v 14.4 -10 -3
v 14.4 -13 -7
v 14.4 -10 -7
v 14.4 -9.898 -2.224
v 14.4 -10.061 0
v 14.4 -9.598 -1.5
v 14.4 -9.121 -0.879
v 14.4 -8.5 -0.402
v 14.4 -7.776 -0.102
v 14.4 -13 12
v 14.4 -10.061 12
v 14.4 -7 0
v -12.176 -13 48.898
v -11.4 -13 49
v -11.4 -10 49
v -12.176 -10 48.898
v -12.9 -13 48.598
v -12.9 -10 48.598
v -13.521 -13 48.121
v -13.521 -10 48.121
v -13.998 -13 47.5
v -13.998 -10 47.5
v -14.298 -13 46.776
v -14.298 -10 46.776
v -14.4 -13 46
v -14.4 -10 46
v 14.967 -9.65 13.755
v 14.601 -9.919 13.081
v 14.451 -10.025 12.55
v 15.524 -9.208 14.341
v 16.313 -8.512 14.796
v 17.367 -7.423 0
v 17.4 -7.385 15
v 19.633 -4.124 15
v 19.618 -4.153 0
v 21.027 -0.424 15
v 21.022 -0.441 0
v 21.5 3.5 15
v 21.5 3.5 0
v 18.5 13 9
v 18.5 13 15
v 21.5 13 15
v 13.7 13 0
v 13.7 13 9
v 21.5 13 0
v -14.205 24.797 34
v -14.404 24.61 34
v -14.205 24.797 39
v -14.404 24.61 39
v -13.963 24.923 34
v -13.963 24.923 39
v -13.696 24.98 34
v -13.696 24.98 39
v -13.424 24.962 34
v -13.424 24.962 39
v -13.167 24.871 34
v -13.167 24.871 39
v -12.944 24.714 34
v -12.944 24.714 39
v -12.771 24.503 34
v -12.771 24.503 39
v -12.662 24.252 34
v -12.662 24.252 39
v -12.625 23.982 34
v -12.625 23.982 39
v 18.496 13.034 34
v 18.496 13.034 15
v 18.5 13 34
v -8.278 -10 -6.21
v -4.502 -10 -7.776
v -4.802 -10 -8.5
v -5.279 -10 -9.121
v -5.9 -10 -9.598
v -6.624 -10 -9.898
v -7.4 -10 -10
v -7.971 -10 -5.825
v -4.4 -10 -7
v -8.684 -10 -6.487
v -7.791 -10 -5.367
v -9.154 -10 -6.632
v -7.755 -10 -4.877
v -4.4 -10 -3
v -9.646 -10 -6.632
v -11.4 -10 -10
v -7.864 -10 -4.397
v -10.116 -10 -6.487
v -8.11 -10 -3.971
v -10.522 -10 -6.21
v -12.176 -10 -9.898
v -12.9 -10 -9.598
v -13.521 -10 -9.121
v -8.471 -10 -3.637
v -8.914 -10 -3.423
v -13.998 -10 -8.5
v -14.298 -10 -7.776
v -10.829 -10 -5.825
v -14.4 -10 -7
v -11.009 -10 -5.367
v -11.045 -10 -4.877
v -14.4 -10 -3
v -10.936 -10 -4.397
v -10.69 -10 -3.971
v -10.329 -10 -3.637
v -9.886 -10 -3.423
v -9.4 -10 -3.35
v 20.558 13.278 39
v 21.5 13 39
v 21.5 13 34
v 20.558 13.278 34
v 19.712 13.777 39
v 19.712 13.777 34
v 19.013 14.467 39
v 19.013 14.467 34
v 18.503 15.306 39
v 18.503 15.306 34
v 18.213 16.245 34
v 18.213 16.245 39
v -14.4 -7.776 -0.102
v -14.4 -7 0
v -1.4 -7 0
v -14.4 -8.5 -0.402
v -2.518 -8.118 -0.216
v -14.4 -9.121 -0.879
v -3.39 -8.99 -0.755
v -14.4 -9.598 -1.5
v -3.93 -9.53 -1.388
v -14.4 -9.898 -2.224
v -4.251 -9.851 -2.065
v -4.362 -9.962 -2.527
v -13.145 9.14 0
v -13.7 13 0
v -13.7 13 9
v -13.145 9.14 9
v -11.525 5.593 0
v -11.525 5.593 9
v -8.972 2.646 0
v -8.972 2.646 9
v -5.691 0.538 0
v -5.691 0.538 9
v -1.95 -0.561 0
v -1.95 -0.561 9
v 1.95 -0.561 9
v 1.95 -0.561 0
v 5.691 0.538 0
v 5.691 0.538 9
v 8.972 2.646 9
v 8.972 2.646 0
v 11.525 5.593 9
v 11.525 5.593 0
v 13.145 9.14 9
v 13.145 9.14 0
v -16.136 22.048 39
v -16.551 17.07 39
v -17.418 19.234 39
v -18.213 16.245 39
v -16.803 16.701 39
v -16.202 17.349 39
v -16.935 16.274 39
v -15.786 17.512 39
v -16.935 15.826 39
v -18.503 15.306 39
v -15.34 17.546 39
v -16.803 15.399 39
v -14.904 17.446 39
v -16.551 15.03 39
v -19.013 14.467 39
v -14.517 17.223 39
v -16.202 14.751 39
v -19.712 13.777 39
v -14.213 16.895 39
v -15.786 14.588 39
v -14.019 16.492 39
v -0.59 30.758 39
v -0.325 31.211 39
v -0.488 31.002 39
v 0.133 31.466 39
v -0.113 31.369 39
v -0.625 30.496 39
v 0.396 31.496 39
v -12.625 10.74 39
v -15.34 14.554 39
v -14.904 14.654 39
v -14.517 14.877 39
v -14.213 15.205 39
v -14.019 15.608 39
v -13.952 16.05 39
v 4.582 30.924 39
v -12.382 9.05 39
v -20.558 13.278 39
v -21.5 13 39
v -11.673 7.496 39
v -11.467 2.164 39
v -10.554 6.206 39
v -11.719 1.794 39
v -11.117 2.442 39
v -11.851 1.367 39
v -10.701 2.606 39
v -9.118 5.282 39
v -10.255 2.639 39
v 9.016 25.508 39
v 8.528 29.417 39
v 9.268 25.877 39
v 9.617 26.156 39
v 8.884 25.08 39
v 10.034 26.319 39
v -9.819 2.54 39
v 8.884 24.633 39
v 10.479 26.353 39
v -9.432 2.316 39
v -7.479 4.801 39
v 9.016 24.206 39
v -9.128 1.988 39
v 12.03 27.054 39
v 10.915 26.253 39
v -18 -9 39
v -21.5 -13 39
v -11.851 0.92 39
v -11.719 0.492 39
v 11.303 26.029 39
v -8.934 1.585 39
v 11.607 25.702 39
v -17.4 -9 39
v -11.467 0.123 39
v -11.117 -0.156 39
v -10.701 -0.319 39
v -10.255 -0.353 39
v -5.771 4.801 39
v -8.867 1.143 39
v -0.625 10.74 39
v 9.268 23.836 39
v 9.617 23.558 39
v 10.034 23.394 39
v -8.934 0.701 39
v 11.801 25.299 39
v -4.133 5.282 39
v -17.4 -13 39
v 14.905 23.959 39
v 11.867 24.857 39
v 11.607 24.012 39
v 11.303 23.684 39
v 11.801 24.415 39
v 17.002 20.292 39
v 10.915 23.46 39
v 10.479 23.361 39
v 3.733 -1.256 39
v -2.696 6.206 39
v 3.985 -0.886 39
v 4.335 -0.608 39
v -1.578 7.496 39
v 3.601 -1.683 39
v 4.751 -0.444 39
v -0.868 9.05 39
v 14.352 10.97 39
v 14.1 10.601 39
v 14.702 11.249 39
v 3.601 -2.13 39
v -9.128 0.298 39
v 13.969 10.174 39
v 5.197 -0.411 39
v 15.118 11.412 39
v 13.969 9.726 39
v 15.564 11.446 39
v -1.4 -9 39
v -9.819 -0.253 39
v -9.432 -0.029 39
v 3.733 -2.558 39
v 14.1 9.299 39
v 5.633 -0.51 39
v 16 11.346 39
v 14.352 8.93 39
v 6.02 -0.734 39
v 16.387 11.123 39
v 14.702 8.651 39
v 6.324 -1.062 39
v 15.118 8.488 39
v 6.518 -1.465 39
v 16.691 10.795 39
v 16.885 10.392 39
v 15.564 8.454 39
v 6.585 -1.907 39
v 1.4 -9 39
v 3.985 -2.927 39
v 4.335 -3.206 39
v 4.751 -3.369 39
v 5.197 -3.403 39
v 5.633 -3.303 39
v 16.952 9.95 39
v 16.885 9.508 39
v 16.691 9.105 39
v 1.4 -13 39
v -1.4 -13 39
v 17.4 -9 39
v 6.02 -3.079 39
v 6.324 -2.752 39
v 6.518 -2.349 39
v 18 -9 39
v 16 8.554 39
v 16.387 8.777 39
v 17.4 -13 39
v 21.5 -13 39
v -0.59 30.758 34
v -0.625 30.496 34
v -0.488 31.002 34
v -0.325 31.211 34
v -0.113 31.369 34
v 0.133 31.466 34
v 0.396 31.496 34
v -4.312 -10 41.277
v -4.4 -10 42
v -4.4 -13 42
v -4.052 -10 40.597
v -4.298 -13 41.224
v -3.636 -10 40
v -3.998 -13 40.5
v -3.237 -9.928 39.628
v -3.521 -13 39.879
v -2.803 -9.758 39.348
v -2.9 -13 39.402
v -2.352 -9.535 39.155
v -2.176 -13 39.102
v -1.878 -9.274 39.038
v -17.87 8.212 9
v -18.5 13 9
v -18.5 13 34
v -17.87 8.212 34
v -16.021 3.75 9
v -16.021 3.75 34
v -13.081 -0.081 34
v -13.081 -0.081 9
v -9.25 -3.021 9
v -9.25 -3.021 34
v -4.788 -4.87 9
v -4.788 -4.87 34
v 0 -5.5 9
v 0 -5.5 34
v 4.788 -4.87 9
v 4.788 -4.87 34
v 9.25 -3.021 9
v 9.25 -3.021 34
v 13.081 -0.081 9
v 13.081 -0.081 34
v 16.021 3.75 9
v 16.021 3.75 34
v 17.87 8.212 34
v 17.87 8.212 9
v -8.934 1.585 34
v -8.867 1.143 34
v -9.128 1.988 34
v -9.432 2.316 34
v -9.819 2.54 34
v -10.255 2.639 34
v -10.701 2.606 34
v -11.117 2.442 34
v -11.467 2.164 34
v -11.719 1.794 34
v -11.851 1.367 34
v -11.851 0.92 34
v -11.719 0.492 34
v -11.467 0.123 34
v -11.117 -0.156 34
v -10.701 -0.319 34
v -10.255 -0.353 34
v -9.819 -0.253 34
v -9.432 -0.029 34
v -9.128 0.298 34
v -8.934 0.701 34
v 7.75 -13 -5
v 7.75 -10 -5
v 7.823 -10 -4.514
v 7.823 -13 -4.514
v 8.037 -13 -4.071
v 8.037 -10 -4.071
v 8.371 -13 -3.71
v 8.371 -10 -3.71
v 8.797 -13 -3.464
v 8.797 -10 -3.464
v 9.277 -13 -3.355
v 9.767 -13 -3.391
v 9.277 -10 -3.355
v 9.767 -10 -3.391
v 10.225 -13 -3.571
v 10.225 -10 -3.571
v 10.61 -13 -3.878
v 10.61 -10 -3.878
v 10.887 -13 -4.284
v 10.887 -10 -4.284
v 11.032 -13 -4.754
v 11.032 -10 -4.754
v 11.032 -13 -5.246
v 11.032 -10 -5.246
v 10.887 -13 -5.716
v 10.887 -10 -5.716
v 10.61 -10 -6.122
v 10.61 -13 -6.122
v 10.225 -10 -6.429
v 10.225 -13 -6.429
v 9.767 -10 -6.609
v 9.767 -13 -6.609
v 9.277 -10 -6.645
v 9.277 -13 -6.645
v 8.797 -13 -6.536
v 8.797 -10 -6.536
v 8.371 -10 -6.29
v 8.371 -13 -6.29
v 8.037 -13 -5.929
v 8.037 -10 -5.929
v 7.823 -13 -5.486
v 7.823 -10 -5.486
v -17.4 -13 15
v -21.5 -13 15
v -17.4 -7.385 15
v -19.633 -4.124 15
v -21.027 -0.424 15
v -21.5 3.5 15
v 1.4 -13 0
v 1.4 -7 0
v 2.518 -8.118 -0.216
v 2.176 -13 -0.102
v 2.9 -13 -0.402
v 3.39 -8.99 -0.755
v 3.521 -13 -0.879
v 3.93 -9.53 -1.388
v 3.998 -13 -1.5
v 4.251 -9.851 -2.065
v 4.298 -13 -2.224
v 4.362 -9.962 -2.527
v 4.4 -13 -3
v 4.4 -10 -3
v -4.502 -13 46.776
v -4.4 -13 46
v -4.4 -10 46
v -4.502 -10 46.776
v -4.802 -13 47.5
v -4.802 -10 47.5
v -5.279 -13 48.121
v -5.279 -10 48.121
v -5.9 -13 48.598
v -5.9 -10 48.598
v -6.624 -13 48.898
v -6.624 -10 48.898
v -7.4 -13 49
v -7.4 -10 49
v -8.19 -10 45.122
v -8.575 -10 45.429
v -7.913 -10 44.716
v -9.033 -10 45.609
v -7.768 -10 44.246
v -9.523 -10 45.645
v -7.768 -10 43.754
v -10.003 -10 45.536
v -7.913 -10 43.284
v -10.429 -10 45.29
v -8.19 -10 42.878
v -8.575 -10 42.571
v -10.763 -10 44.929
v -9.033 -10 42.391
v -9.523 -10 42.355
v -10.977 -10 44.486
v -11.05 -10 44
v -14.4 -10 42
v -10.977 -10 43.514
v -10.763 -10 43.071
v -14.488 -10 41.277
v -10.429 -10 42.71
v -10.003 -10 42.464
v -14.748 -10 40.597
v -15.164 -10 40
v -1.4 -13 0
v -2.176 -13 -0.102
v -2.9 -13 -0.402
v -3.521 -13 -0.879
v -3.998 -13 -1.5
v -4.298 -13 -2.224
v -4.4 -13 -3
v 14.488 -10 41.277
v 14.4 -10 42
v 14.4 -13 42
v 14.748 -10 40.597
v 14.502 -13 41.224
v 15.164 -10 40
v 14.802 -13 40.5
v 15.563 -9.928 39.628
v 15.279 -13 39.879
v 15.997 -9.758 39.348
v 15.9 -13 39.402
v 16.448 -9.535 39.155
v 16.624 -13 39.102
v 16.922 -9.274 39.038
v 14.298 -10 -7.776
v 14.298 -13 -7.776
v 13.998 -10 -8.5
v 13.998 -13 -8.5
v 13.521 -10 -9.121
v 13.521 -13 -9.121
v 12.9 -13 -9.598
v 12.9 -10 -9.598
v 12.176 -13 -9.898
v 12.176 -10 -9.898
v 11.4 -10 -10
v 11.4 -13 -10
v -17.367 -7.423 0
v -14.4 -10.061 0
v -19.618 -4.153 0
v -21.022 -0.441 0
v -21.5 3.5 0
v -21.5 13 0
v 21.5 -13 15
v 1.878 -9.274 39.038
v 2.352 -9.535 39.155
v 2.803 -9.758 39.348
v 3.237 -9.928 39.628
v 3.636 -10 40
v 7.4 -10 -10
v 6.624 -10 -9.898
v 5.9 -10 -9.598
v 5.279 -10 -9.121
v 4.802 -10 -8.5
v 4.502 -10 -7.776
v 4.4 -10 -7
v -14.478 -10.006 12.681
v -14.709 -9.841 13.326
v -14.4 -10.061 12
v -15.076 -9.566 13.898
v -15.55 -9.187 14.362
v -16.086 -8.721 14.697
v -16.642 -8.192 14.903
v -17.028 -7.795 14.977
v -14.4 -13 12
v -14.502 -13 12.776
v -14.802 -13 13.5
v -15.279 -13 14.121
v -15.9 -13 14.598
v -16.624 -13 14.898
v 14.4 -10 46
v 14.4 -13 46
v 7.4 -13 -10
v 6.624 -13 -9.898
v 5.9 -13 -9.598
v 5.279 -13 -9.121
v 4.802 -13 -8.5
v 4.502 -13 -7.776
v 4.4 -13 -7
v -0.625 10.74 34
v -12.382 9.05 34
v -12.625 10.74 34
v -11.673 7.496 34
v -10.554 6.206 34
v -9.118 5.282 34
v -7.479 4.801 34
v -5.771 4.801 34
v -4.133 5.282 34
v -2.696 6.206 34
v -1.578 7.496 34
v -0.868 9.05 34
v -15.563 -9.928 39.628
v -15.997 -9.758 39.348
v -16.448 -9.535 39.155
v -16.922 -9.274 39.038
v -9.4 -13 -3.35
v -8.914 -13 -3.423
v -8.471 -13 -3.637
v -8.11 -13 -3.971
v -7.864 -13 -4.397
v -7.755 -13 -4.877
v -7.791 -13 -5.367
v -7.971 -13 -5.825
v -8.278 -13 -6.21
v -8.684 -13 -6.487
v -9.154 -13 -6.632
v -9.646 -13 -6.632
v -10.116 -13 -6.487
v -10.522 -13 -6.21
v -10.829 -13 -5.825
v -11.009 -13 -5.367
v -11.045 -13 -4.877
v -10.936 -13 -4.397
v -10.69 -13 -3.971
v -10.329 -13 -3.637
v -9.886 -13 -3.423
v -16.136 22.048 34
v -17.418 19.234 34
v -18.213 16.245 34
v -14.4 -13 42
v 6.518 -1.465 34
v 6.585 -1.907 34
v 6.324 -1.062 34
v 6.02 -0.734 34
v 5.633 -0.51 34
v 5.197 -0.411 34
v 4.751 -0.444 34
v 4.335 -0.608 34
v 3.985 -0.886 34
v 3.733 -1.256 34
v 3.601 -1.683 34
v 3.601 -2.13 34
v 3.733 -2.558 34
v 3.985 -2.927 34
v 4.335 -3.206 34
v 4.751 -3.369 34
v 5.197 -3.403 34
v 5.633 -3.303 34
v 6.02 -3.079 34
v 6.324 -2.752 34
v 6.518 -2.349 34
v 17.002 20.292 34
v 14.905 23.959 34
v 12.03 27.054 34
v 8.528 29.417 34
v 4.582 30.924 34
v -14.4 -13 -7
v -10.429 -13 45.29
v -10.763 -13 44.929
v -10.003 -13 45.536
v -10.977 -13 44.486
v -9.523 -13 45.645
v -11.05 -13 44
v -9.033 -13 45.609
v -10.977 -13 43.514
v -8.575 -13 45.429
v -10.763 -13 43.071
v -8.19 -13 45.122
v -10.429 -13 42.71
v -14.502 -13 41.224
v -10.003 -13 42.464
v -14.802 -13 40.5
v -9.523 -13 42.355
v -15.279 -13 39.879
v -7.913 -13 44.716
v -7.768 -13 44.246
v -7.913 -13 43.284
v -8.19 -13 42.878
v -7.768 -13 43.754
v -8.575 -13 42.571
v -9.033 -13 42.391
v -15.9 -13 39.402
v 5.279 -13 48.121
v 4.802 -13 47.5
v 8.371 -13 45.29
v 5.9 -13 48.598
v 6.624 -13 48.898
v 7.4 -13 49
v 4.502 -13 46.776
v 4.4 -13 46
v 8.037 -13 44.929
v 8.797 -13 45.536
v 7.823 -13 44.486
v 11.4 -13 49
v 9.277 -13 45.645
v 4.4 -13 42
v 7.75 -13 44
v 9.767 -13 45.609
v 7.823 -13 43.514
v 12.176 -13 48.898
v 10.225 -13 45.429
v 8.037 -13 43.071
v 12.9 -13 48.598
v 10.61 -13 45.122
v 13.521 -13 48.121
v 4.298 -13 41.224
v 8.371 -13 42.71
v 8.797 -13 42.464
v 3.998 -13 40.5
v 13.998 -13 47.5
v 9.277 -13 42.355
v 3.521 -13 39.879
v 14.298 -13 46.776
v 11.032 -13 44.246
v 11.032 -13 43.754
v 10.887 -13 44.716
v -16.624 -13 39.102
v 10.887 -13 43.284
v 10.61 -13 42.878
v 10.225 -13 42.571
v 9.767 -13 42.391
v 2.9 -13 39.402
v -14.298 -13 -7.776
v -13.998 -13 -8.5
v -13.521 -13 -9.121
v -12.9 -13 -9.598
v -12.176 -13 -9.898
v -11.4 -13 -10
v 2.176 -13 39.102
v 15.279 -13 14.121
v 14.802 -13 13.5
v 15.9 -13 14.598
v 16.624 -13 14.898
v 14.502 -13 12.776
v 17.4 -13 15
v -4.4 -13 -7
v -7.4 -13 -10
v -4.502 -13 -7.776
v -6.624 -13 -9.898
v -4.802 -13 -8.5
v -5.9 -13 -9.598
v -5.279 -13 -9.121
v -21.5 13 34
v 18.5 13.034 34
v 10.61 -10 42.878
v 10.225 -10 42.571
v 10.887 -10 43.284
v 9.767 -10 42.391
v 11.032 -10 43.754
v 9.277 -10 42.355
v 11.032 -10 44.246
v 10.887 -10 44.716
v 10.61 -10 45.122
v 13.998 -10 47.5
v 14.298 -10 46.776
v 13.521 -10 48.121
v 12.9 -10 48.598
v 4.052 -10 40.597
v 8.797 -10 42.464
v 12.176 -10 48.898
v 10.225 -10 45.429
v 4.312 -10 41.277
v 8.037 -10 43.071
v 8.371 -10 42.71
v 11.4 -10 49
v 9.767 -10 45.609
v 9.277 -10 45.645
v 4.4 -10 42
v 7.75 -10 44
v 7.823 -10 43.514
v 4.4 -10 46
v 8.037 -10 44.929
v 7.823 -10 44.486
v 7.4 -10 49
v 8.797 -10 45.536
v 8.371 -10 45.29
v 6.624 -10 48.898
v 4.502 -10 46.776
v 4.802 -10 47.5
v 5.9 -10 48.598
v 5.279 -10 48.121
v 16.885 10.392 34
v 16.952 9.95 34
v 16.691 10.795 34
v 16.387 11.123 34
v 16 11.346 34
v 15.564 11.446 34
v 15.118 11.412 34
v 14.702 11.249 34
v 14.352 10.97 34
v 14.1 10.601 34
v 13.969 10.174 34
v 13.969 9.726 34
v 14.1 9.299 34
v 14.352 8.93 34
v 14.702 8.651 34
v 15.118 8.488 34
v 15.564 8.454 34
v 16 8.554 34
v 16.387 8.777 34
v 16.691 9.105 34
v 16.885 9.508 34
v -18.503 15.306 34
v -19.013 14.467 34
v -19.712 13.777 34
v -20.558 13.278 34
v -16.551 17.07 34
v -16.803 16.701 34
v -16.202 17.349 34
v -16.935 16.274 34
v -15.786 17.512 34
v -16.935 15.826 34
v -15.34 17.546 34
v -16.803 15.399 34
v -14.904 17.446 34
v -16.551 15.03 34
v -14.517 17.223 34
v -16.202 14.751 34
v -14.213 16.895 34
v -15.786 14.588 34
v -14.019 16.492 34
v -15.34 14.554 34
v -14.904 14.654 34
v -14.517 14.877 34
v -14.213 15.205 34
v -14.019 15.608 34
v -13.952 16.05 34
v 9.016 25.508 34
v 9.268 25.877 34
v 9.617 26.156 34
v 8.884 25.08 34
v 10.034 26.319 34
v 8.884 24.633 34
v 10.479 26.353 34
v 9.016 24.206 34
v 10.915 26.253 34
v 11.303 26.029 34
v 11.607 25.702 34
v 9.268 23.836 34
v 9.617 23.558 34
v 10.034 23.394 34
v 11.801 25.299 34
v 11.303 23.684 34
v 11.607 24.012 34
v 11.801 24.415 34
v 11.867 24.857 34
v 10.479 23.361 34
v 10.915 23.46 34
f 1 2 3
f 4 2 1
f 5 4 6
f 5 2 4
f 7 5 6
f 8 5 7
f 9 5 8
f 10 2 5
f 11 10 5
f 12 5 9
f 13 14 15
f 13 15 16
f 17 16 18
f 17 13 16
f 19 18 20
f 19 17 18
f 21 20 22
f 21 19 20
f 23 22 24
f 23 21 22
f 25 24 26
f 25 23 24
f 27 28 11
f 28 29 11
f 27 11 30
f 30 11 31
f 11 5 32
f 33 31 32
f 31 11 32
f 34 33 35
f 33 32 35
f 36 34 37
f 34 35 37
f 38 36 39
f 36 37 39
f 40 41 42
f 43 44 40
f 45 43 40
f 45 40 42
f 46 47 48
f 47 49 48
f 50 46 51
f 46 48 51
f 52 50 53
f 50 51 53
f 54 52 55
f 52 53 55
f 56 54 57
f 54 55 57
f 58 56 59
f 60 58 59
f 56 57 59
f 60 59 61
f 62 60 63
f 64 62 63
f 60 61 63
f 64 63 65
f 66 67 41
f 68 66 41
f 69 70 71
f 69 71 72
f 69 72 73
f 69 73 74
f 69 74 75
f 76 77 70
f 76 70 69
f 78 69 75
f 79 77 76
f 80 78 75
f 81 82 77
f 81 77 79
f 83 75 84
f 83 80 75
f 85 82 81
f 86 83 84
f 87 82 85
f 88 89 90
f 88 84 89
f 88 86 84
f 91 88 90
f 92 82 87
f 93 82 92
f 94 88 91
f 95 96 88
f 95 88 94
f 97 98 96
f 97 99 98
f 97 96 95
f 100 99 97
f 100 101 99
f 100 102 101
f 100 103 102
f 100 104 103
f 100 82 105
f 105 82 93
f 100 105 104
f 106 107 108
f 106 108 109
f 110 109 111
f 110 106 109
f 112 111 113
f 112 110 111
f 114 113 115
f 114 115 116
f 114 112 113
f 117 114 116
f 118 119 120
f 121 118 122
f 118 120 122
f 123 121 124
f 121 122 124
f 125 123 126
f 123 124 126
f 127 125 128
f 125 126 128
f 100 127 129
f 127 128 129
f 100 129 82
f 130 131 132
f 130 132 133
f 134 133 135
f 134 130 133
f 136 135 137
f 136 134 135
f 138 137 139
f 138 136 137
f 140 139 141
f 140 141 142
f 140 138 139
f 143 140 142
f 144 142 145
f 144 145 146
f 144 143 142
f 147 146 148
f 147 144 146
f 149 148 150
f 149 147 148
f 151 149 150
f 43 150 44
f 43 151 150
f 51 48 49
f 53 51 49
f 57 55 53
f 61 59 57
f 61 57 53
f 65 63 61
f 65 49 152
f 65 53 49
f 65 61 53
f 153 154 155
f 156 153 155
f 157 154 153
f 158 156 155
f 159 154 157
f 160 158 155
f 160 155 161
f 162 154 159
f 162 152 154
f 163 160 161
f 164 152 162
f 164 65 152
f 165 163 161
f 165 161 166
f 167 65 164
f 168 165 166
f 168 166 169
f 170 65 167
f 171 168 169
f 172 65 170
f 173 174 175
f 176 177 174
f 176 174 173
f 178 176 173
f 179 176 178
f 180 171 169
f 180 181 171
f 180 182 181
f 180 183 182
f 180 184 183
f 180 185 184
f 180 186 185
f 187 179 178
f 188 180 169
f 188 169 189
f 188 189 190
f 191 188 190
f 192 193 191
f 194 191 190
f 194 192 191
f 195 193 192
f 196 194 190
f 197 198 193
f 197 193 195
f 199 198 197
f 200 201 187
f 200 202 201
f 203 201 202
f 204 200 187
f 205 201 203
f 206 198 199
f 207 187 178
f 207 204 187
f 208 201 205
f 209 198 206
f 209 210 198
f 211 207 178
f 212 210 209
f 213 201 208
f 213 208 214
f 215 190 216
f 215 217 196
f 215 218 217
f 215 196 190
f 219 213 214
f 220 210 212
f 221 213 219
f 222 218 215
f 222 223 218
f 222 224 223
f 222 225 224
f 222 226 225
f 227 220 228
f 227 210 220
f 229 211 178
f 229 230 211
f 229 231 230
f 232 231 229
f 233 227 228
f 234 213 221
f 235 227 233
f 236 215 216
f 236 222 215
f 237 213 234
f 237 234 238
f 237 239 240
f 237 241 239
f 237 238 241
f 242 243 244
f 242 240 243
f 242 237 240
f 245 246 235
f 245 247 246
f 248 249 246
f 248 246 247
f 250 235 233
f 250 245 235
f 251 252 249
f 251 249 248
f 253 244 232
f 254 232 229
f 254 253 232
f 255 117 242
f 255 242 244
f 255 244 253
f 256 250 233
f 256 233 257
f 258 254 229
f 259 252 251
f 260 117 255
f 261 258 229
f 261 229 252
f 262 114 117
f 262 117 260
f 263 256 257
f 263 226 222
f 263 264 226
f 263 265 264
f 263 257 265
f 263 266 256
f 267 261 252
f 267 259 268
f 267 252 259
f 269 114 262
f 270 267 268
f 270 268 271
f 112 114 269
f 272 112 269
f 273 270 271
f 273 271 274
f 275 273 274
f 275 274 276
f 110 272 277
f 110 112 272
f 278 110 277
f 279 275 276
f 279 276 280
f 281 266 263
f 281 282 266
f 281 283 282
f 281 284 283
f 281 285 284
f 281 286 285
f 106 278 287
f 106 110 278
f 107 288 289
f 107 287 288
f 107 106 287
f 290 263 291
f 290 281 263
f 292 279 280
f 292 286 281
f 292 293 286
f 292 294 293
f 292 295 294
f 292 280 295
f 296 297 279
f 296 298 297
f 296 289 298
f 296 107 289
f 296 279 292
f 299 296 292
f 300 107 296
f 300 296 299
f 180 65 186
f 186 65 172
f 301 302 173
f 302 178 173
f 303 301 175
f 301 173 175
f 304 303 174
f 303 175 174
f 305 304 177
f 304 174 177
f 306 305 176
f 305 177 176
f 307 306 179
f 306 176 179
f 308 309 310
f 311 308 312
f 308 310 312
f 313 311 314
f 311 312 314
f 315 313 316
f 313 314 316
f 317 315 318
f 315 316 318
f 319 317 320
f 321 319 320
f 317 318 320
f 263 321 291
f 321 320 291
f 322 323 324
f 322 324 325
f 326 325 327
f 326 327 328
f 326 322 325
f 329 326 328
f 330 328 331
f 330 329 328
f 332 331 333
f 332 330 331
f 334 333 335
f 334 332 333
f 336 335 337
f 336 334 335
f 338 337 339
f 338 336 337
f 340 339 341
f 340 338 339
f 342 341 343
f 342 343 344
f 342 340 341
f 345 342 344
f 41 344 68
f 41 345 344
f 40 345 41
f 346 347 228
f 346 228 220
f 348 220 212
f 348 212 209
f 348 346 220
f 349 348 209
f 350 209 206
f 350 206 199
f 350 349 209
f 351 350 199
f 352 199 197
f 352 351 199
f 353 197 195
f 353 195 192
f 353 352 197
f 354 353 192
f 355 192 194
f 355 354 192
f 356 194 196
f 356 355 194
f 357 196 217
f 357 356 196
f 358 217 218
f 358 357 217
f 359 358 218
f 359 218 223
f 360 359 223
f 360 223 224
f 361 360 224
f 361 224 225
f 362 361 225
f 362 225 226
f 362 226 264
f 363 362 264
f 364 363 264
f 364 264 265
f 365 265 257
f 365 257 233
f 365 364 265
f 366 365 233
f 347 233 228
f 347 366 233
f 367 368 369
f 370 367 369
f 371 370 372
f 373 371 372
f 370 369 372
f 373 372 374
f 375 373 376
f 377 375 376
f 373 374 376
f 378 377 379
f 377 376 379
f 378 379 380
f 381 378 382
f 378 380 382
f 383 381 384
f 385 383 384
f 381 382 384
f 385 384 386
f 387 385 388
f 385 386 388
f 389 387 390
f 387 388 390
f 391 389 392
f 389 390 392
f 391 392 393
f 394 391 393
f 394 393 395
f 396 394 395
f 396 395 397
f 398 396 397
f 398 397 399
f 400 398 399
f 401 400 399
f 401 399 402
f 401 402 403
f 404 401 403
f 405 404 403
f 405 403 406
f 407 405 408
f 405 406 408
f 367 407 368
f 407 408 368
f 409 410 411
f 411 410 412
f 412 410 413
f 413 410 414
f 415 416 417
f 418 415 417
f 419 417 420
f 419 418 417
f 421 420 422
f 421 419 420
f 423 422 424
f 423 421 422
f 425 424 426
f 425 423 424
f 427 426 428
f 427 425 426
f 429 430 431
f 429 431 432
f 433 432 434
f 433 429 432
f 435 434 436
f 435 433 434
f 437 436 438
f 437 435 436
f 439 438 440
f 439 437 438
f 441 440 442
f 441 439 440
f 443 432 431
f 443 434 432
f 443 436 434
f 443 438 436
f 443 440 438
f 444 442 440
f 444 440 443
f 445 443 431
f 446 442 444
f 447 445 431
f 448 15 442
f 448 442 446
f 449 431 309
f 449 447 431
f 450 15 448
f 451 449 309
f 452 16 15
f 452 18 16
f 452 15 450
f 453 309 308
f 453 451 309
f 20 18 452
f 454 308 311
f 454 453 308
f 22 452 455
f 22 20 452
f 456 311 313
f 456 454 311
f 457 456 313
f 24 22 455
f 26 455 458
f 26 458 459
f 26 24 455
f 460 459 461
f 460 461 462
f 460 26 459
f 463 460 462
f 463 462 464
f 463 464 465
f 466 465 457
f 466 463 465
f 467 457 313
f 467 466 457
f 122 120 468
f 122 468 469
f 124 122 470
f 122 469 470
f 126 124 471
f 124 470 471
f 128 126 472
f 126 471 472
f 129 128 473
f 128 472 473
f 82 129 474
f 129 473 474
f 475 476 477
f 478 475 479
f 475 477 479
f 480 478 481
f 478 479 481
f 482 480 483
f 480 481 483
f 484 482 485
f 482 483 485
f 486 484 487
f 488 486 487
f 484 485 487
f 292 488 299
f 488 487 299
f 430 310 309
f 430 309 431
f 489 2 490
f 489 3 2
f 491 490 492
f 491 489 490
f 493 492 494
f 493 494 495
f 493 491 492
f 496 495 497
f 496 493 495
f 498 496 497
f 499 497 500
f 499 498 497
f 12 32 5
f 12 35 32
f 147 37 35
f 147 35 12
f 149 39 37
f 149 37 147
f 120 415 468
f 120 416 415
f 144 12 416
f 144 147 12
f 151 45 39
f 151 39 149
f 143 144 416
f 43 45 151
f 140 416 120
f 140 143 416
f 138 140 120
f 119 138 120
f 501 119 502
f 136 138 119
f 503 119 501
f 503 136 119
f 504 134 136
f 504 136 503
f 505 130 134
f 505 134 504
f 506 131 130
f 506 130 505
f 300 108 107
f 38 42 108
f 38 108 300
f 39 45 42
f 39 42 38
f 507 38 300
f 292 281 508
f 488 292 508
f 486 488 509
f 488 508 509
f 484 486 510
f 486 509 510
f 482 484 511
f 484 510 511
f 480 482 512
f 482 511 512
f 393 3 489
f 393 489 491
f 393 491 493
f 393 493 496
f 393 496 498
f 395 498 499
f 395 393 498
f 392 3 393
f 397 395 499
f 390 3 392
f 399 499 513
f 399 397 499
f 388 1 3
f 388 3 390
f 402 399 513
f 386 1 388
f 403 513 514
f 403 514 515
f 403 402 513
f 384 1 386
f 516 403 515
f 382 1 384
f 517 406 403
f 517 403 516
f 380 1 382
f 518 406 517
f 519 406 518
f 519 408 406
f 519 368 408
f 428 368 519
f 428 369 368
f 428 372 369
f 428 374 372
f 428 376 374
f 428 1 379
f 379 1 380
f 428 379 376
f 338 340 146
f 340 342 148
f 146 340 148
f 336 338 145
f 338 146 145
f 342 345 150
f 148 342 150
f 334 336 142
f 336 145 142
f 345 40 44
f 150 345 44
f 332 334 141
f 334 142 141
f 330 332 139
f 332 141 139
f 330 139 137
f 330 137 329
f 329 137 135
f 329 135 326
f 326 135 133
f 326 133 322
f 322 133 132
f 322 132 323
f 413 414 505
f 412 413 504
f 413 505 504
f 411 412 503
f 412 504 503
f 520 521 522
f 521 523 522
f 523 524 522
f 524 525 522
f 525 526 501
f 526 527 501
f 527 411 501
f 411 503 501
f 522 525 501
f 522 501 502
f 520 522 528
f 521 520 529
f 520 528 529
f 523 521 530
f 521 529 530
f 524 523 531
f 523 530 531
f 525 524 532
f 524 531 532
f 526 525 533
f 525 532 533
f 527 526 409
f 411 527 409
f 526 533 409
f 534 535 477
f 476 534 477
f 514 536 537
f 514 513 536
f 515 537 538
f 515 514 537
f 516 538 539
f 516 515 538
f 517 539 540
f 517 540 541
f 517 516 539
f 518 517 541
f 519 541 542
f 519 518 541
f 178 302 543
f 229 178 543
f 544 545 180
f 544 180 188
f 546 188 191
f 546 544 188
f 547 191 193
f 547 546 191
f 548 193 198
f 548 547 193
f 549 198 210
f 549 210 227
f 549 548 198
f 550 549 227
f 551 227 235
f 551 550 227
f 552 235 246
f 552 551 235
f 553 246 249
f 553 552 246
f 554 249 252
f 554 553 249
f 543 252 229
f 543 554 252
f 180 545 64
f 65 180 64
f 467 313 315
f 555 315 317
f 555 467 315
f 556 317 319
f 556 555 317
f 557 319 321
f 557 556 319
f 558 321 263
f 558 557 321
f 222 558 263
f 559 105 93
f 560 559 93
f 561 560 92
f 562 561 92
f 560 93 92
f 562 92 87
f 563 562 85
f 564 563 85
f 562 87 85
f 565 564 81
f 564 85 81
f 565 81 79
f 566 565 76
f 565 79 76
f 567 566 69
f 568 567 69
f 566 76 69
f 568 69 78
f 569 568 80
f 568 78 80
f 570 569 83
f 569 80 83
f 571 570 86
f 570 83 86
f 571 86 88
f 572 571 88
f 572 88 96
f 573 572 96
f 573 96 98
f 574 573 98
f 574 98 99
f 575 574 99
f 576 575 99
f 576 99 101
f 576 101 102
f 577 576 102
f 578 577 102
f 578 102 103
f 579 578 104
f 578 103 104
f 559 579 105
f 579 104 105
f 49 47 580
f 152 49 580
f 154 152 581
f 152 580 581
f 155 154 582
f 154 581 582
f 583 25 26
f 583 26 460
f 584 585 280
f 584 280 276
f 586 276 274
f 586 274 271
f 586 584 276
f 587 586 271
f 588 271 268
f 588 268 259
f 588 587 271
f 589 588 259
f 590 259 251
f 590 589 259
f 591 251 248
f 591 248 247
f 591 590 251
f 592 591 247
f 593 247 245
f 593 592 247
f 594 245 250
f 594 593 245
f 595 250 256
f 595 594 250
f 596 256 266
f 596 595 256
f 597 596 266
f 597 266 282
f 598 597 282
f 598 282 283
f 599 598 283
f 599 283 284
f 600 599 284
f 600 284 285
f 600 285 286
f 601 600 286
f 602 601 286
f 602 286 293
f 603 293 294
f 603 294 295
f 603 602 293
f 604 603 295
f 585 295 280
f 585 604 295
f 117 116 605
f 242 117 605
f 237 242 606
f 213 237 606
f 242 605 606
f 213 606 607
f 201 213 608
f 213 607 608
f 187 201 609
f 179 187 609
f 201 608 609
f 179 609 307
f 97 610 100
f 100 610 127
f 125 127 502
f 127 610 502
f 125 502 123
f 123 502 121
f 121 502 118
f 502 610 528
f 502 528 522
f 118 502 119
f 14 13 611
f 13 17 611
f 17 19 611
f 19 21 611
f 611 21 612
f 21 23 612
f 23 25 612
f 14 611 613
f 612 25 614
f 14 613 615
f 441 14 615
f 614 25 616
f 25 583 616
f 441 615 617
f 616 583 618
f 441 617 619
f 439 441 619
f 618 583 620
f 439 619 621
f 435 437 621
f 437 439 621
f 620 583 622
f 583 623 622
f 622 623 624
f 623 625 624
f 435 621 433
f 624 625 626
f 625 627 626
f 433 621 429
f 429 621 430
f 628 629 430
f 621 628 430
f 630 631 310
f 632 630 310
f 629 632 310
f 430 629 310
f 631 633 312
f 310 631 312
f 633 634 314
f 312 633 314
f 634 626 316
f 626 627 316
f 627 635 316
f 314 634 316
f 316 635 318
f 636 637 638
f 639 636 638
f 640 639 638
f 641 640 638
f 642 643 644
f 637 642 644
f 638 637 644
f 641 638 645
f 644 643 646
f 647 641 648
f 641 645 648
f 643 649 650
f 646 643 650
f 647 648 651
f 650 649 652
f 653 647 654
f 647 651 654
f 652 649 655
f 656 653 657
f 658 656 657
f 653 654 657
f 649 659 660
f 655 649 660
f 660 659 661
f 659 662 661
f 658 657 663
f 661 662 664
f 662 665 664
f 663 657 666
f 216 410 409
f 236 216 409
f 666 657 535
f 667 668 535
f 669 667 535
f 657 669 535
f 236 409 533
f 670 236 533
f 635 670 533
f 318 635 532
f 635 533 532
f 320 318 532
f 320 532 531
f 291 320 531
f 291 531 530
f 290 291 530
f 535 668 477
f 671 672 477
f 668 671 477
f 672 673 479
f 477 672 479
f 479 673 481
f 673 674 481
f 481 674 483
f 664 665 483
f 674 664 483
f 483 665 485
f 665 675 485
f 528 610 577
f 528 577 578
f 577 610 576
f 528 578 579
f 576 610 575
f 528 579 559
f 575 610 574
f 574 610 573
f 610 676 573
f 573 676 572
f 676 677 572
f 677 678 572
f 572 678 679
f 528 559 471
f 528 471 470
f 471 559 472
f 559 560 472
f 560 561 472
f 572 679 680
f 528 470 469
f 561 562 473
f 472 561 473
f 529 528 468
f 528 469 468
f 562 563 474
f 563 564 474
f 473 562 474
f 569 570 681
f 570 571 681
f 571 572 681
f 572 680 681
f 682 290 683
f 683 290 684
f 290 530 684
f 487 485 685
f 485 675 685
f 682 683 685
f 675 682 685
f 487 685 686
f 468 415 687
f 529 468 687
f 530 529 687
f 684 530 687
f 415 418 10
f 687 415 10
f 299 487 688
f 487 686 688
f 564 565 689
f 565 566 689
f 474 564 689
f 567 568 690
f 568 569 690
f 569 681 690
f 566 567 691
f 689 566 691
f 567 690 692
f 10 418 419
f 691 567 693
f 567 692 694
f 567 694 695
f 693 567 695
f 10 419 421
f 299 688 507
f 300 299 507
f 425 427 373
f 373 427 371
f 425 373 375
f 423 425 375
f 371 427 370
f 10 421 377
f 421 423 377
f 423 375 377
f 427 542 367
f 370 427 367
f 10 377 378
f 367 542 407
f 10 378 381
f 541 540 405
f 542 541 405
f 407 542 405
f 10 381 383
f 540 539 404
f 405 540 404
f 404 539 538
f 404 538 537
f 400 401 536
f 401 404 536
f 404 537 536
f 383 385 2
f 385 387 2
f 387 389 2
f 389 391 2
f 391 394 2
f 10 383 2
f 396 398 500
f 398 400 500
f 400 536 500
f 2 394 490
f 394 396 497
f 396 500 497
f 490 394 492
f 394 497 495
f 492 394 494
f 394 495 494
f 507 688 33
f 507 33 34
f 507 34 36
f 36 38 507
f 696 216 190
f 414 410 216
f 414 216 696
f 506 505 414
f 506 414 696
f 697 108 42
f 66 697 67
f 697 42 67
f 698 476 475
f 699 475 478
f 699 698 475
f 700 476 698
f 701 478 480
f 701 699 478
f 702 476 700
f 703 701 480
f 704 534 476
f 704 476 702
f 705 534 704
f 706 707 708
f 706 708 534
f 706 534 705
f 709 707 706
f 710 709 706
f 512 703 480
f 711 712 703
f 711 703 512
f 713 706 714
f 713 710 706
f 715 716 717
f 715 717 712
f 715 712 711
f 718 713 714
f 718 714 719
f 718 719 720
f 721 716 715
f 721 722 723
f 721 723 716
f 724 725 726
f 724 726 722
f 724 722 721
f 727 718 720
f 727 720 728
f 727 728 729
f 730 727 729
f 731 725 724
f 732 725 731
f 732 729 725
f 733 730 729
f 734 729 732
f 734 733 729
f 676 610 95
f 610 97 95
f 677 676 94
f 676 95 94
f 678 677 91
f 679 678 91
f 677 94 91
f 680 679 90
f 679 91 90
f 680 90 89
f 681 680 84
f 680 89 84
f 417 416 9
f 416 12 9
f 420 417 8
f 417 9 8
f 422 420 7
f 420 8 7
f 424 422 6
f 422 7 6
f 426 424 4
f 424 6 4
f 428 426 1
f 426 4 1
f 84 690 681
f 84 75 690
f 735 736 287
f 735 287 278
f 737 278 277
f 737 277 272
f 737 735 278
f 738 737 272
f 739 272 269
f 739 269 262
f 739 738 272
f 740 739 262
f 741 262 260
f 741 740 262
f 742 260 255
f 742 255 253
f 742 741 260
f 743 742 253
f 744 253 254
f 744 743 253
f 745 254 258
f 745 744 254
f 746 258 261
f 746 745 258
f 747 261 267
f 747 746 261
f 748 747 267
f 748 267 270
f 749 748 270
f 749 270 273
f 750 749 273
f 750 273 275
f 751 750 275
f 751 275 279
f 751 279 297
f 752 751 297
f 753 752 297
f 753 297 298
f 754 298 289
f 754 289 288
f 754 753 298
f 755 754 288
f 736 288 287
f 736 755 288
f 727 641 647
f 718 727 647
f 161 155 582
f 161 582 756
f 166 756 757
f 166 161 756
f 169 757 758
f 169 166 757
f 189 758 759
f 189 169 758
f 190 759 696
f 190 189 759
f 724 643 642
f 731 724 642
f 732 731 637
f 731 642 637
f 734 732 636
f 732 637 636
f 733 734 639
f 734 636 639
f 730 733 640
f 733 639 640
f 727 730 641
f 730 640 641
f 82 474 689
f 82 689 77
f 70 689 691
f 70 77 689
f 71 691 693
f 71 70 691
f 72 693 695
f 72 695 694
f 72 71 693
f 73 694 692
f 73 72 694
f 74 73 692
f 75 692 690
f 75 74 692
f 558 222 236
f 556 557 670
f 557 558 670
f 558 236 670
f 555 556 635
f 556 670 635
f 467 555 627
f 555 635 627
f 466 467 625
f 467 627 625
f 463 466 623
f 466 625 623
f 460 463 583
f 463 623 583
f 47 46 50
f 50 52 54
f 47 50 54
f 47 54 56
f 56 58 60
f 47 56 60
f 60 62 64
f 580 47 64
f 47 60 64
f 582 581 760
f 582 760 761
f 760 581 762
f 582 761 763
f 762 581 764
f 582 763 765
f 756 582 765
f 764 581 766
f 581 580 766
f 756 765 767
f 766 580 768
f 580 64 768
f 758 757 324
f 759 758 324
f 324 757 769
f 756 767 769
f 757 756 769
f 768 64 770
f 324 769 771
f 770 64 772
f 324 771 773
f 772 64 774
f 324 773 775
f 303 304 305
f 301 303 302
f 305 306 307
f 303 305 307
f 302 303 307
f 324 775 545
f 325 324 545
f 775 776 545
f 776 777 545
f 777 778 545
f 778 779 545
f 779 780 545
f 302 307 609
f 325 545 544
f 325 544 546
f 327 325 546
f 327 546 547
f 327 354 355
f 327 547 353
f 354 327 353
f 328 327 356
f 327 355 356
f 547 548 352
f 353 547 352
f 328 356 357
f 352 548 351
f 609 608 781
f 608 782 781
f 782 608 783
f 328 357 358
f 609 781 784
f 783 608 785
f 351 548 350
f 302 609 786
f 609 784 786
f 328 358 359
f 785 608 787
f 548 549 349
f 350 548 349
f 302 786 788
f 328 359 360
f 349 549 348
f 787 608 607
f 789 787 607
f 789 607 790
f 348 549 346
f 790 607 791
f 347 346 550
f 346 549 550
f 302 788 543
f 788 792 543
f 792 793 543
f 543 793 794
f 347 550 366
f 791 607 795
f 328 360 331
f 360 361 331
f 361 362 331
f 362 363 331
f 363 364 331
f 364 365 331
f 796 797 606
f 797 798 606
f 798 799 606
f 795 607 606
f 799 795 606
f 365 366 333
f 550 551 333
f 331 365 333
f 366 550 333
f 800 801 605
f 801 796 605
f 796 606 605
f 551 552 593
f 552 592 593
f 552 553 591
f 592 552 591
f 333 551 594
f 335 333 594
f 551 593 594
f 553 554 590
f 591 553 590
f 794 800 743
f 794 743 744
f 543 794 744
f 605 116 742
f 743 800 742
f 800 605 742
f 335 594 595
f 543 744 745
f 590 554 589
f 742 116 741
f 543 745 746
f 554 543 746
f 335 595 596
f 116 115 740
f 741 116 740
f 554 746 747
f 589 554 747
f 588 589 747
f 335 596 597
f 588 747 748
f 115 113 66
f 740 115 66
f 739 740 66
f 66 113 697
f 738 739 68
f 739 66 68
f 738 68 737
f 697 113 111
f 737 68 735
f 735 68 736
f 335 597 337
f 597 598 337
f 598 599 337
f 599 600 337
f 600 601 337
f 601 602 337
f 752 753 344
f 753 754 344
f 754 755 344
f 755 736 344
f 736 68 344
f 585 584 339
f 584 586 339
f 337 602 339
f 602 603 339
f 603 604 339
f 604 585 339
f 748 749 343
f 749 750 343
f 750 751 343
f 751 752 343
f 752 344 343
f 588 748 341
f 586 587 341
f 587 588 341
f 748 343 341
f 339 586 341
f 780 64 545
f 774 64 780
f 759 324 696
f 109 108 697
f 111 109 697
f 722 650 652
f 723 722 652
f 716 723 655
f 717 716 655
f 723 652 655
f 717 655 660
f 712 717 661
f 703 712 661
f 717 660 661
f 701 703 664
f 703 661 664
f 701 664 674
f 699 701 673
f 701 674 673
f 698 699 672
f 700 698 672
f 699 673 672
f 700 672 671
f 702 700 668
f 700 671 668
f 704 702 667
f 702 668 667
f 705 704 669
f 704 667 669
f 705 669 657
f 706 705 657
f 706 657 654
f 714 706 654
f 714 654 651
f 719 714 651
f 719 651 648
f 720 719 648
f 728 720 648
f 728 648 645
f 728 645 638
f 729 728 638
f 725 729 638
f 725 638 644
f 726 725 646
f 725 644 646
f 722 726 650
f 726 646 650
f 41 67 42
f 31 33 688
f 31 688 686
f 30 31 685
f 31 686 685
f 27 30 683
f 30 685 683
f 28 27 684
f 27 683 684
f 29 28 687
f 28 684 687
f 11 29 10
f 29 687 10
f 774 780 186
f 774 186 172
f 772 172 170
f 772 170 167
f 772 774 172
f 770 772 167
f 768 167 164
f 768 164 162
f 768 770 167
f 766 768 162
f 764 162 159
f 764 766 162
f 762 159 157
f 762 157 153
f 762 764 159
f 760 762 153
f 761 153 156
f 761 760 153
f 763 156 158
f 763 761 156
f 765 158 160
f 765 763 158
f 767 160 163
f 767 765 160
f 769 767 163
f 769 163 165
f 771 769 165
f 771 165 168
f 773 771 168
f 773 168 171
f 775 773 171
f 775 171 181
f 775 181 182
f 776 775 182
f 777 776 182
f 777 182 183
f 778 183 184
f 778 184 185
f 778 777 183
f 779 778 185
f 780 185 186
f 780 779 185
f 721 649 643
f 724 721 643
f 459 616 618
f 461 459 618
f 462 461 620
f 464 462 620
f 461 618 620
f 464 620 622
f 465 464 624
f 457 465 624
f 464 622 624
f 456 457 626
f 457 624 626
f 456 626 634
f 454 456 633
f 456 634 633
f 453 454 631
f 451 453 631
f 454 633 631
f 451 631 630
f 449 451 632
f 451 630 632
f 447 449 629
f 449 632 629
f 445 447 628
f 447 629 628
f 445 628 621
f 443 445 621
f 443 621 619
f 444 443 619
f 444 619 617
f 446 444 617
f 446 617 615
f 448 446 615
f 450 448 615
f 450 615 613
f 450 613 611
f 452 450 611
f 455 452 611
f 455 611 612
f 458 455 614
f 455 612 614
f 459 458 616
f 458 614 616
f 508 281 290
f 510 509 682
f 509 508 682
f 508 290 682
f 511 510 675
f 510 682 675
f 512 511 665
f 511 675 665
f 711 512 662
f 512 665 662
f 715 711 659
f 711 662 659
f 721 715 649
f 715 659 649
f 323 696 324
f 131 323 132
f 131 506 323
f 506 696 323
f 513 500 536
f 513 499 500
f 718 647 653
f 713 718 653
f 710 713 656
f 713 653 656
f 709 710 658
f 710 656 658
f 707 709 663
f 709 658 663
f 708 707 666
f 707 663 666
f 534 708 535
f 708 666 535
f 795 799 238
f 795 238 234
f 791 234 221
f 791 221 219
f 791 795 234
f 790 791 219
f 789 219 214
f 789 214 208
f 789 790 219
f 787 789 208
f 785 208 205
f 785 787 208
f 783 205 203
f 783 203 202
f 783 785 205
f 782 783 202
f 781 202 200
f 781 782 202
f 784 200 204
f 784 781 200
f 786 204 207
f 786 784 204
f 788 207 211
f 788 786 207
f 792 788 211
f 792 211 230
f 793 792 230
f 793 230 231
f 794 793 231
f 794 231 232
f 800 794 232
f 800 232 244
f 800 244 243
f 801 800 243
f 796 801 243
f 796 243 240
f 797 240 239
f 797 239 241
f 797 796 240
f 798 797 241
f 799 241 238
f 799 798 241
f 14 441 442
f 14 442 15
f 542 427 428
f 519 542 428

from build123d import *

# Parameters (mm, degrees)
BOSS_EXTRUDE1_DEPTH      = 9
BOSS_EXTRUDE2_DEPTH      = 25
FILLET1_R                = 16.5
BOSS_EXTRUDE3_START      = -34
SKETCH4_W                = 10
SKETCH4_H                = 3
BOSS_EXTRUDE3_DEPTH      = 44
SKETCH5_R                = 1.65
CUT_EXTRUDE1_DEPTH       = 3
FILLET2_R                = 3
SKETCH12_R               = 18.5
SKETCH12_R_2             = 1.5
SKETCH12_R_3             = 6
BOSS_EXTRUDE8_DEPTH      = 5
BOSS_EXTRUDE9_DEPTH      = 5
BOSS_EXTRUDE9_DEPTH_BACK = 19
SKETCH14_R               = 1.65
BOSS_EXTRUDE11_DEPTH     = 3
CUT_EXTRUDE2_START       = -6
CUT_EXTRUDE2_DEPTH       = 6
FILLET4_R                = 1
FILLET5_START            = -13
FILLET5_DEPTH            = 6
FILLET5_2_DEPTH          = 4
FILLET5_START_2          = -18
FILLET5_3_DEPTH          = 36
FILLET6_R                = 4


with BuildPart() as part:
    # Sketch1 → Boss-Extrude1 (new body)
    with BuildSketch(Plane.XY):
        with BuildLine():
            Line((13.7, 13), (21.5, 13))
            Line((21.5, 13), (21.5, -13))
            Line((21.5, -13), (-21.5, -13))
            Line((-21.5, -13), (-21.5, 13))
            Line((-21.5, 13), (-13.7, 13))
            ThreePointArc((-13.7, 13), (0, -0.7), (13.7, 13))
        make_face()
    extrude(amount=BOSS_EXTRUDE1_DEPTH)

    # Sketch2 → Boss-Extrude2 (add)
    with BuildSketch(Plane.XY.offset(9)):
        with BuildLine():
            Line((18.5, 13), (21.5, 13))
            Line((21.5, 13), (21.5, -13))
            Line((21.5, -13), (-21.5, -13))
            Line((-21.5, -13), (-21.5, 13))
            Line((-21.5, 13), (-18.5, 13))
            ThreePointArc((-18.5, 13), (0, -5.5), (18.5, 13))
        make_face()
    extrude(amount=BOSS_EXTRUDE2_DEPTH)

    # Fillet1
    fillet1_edges = [part.edges().sort_by_distance(p)[0] for p in [
        (21.5, -13, 17),
        (-21.5, -13, 17),
    ]]
    fillet(fillet1_edges, radius=FILLET1_R)

    # Sketch4 → Boss-Extrude3 (add)
    with BuildSketch(Plane(origin=(0, 0, 0), x_dir=(-1, 0, 0), z_dir=(0, 0, -1)).offset(BOSS_EXTRUDE3_START)):
        with Locations((-9.4, -11.5)):
            Rectangle(SKETCH4_W, SKETCH4_H)
        with Locations((9.4, -11.5)):
            Rectangle(SKETCH4_W, SKETCH4_H)
    extrude(amount=BOSS_EXTRUDE3_DEPTH)

    # Sketch5 → Cut-Extrude1 (cut)
    with BuildSketch(Plane(origin=(0, -10, 0), x_dir=(1, 0, 0), z_dir=(0, 1, 0))):
        with Locations(Location((9.4, 5, 0), (0, 0, 180))):
            Circle(SKETCH5_R)
        with Locations(Location((-9.4, 5, 0), (0, 0, 270))):
            Circle(SKETCH5_R)
    extrude(amount=-CUT_EXTRUDE1_DEPTH, mode=Mode.SUBTRACT)

    # Fillet2
    fillet2_edges = [part.edges().sort_by_distance(p)[0] for p in [
        (4.4, -11.5, 0),
        (9.4, -10, 0),
        (14.4, -11.5, -10),
        (4.4, -11.5, -10),
        (-9.4, -10, 0),
        (-4.4, -11.5, 0),
        (-14.4, -11.5, -10),
        (-4.4, -11.5, -10),
    ]]
    fillet(fillet2_edges, radius=FILLET2_R)



with BuildPart() as body_2:
    # Sketch12 → Boss-Extrude8 (new body)
    with BuildSketch(Plane.XY.offset(34)):
        with Locations((0, 13)):
            Circle(SKETCH12_R)
        with Locations((-15.451860729, 16.05)):
            Circle(SKETCH12_R_2, mode=Mode.SUBTRACT)
        with Locations((-5.084552883, 27.906703927)):
            Circle(SKETCH12_R_2, mode=Mode.SUBTRACT)
        with Locations((10.367307846, 24.856703927)):
            Circle(SKETCH12_R_2, mode=Mode.SUBTRACT)
        with Locations((15.451860729, 9.95)):
            Circle(SKETCH12_R_2, mode=Mode.SUBTRACT)
        with Locations((5.084552883, -1.906703927)):
            Circle(SKETCH12_R_2, mode=Mode.SUBTRACT)
        with Locations((-10.367307846, 1.143296073)):
            Circle(SKETCH12_R_2, mode=Mode.SUBTRACT)
        with Locations((-6.625133961, 10.74)):
            Circle(SKETCH12_R_3, mode=Mode.SUBTRACT)
    extrude(amount=BOSS_EXTRUDE8_DEPTH)


with BuildPart() as part_1:
    add(part.part)

    add(body_2.part)  # Boss-Extrude9 merges body 2
    # Sketch13 → Boss-Extrude9 (add, two sides: drawn at the far end of the back side and taken through both)
    with BuildSketch(Plane.XY.offset(34).offset(-BOSS_EXTRUDE9_DEPTH_BACK)):
        with BuildLine():
            Line((-21.5, 13), (-21.5, -13))
            Line((-21.5, -13), (21.5, -13))
            Line((21.5, -13), (21.5, 13))
            Line((21.5, 13), (18.496156013, 13.034404843))
            Line((18.496156013, 13.034404843), (18.5, 13))
            ThreePointArc((18.5, 13), (0, -5.5), (-18.5, 13))
            Line((-18.5, 13), (-21.5, 13))
        make_face()
    extrude(amount=BOSS_EXTRUDE9_DEPTH + BOSS_EXTRUDE9_DEPTH_BACK)

    # Sketch14 → Boss-Extrude11 (add)
    # profile 1 of 2: a face of its own
    with BuildSketch(Plane.XZ.offset(13)):
        with BuildLine():
            Line((7.4, 49), (11.4, 49))
            ThreePointArc((11.4, 49), (13.521320344, 48.121320344), (14.4, 46))
            Line((14.4, 46), (14.4, 39))
            Line((14.4, 39), (4.4, 39))
            Line((4.4, 39), (4.4, 46))
            ThreePointArc((4.4, 46), (5.278679656, 48.121320344), (7.4, 49))
        make_face()
        with Locations(Location((9.4, 44, 0), (0, 0, 180))):
            Circle(SKETCH14_R, mode=Mode.SUBTRACT)
    # profile 2 of 2: a face of its own
    with BuildSketch(Plane.XZ.offset(13)):
        with BuildLine():
            Line((-7.4, 49), (-11.4, 49))
            ThreePointArc((-11.4, 49), (-13.521320344, 48.121320344), (-14.4, 46))
            Line((-14.4, 46), (-14.4, 39))
            Line((-14.4, 39), (-4.4, 39))
            Line((-4.4, 39), (-4.4, 46))
            ThreePointArc((-4.4, 46), (-5.278679656, 48.121320344), (-7.4, 49))
        make_face()
        with Locations(Location((-9.4, 44, 0), (0, 0, 180))):
            Circle(SKETCH14_R, mode=Mode.SUBTRACT)
    extrude(amount=-BOSS_EXTRUDE11_DEPTH)

    # Sketch15 → Cut-Extrude2 (cut)
    with BuildSketch(Plane.XY.offset(39).offset(CUT_EXTRUDE2_START)):
        with BuildLine():
            Line((-12.625133961, 10.74), (-12.625133961, 26.522425539))
            ThreePointArc((-12.625133961, 26.522425539), (-7.075323018, 30.093560314), (-0.625133961, 31.489435025))
            Line((-0.625133961, 31.489435025), (-0.625133961, 10.74))
            ThreePointArc((-0.625133961, 10.74), (-6.625133961, 4.74), (-12.625133961, 10.74))
        make_face()
    extrude(amount=CUT_EXTRUDE2_DEPTH, mode=Mode.SUBTRACT)

    # Fillet4
    fillet4_edges = [part_1.edges().sort_by_distance(p)[0] for p in [
        (-9.4, -10, 39),
        (9.4, -10, 39),
        (-12.625133961, 26.522425539, 36.5),
        (-0.625133961, 31.489435025, 36.5),
    ]]
    fillet(fillet4_edges, radius=FILLET4_R)

    # Fillet5: read off the stored shape, not the designer's step
    # Fillet5 outline → Fillet5 (add)
    with BuildSketch(Plane(origin=(0, 0, 0), x_dir=(1, 0, 0), z_dir=(0, 1, 0)).offset(FILLET5_START)):
        with BuildLine():
            ThreePointArc((-14.4, -12), (-15.278679656, -14.121320344), (-17.4, -15))
            Line((-17.4, -15), (-14.4, -15))
            Line((-14.4, -15), (-14.4, -12))
        make_face()
        with BuildLine():
            Line((14.4, -15), (17.4, -15))
            ThreePointArc((17.4, -15), (15.278679656, -14.121320344), (14.4, -12))
            Line((14.4, -12), (14.4, -15))
        make_face()
    extrude(amount=FILLET5_DEPTH)

    # Fillet5 2 outline → Fillet5 2 (add)
    with BuildSketch(Plane(origin=(0, 0, 0), x_dir=(1, 0, 0), z_dir=(0, 1, 0)).offset(FILLET5_START)):
        with BuildLine():
            Line((14.4, -39), (14.4, -42))
            ThreePointArc((14.4, -42), (15.278679656, -39.878679656), (17.4, -39))
            Line((17.4, -39), (14.4, -39))
        make_face()
        with BuildLine():
            Line((-14.4, -42), (-14.4, -39))
            Line((-14.4, -39), (-17.4, -39))
            ThreePointArc((-17.4, -39), (-15.278679656, -39.878679656), (-14.4, -42))
        make_face()
        with BuildLine():
            ThreePointArc((-4.4, -42), (-3.521320344, -39.878679656), (-1.4, -39))
            Line((-1.4, -39), (-4.4, -39))
            Line((-4.4, -39), (-4.4, -42))
        make_face()
        with BuildLine():
            Line((4.4, -42), (4.4, -39))
            Line((4.4, -39), (1.4, -39))
            ThreePointArc((1.4, -39), (3.521320344, -39.878679656), (4.4, -42))
        make_face()
    extrude(amount=FILLET5_2_DEPTH)

    # Fillet5 3 outline → Fillet5 3 (cut)
    with BuildSketch(Plane.YZ.offset(FILLET5_START_2)):
        with BuildLine():
            Line((-9, 42), (-10, 42))
            Line((-10, 42), (-10, 40))
            ThreePointArc((-10, 40), (-9.707106781, 39.292893219), (-9, 39))
            Line((-9, 39), (-9, 42))
        make_face()
    extrude(amount=FILLET5_3_DEPTH, mode=Mode.SUBTRACT)

    # Fillet6
    # the kernel refuses this fillet: 4 mm, written as the material it adds along each edge
    with BuildSketch(Plane(origin=(-18.5, 13, 39), x_dir=(-1, 0, 0), z_dir=(0, 0, -1))) as fillet6_piece_1:
        with BuildLine():
            CenterArc((3.651162791, 3.9466425), FILLET6_R, 190.102305056, 70.528779366)
            ThreePointArc((-0.286821705, 3.245017166), (-0.071844932, 1.628834177), (0, 0))
            Line((0, 0), (3, 0))
        make_face()
    extrude(amount=5)
    with BuildSketch(Plane(origin=(18.499968089, 13.034361181, 39), x_dir=(-0.08897012709688518, 0.996034294833448, 0), z_dir=(0, 0, -1))) as fillet6_piece_2:
        with BuildLine():
            CenterArc((3.571919108, 3.984791306), FILLET6_R, 194.473277614, 70.528779366)
            Line((-0.301138135, 2.98507755), (0, 0))
            ThreePointArc((0, 0), (1.611719597, 0.070340211), (3.223439195, 0))
        make_face()
    extrude(amount=5)


solid = part_1.part
